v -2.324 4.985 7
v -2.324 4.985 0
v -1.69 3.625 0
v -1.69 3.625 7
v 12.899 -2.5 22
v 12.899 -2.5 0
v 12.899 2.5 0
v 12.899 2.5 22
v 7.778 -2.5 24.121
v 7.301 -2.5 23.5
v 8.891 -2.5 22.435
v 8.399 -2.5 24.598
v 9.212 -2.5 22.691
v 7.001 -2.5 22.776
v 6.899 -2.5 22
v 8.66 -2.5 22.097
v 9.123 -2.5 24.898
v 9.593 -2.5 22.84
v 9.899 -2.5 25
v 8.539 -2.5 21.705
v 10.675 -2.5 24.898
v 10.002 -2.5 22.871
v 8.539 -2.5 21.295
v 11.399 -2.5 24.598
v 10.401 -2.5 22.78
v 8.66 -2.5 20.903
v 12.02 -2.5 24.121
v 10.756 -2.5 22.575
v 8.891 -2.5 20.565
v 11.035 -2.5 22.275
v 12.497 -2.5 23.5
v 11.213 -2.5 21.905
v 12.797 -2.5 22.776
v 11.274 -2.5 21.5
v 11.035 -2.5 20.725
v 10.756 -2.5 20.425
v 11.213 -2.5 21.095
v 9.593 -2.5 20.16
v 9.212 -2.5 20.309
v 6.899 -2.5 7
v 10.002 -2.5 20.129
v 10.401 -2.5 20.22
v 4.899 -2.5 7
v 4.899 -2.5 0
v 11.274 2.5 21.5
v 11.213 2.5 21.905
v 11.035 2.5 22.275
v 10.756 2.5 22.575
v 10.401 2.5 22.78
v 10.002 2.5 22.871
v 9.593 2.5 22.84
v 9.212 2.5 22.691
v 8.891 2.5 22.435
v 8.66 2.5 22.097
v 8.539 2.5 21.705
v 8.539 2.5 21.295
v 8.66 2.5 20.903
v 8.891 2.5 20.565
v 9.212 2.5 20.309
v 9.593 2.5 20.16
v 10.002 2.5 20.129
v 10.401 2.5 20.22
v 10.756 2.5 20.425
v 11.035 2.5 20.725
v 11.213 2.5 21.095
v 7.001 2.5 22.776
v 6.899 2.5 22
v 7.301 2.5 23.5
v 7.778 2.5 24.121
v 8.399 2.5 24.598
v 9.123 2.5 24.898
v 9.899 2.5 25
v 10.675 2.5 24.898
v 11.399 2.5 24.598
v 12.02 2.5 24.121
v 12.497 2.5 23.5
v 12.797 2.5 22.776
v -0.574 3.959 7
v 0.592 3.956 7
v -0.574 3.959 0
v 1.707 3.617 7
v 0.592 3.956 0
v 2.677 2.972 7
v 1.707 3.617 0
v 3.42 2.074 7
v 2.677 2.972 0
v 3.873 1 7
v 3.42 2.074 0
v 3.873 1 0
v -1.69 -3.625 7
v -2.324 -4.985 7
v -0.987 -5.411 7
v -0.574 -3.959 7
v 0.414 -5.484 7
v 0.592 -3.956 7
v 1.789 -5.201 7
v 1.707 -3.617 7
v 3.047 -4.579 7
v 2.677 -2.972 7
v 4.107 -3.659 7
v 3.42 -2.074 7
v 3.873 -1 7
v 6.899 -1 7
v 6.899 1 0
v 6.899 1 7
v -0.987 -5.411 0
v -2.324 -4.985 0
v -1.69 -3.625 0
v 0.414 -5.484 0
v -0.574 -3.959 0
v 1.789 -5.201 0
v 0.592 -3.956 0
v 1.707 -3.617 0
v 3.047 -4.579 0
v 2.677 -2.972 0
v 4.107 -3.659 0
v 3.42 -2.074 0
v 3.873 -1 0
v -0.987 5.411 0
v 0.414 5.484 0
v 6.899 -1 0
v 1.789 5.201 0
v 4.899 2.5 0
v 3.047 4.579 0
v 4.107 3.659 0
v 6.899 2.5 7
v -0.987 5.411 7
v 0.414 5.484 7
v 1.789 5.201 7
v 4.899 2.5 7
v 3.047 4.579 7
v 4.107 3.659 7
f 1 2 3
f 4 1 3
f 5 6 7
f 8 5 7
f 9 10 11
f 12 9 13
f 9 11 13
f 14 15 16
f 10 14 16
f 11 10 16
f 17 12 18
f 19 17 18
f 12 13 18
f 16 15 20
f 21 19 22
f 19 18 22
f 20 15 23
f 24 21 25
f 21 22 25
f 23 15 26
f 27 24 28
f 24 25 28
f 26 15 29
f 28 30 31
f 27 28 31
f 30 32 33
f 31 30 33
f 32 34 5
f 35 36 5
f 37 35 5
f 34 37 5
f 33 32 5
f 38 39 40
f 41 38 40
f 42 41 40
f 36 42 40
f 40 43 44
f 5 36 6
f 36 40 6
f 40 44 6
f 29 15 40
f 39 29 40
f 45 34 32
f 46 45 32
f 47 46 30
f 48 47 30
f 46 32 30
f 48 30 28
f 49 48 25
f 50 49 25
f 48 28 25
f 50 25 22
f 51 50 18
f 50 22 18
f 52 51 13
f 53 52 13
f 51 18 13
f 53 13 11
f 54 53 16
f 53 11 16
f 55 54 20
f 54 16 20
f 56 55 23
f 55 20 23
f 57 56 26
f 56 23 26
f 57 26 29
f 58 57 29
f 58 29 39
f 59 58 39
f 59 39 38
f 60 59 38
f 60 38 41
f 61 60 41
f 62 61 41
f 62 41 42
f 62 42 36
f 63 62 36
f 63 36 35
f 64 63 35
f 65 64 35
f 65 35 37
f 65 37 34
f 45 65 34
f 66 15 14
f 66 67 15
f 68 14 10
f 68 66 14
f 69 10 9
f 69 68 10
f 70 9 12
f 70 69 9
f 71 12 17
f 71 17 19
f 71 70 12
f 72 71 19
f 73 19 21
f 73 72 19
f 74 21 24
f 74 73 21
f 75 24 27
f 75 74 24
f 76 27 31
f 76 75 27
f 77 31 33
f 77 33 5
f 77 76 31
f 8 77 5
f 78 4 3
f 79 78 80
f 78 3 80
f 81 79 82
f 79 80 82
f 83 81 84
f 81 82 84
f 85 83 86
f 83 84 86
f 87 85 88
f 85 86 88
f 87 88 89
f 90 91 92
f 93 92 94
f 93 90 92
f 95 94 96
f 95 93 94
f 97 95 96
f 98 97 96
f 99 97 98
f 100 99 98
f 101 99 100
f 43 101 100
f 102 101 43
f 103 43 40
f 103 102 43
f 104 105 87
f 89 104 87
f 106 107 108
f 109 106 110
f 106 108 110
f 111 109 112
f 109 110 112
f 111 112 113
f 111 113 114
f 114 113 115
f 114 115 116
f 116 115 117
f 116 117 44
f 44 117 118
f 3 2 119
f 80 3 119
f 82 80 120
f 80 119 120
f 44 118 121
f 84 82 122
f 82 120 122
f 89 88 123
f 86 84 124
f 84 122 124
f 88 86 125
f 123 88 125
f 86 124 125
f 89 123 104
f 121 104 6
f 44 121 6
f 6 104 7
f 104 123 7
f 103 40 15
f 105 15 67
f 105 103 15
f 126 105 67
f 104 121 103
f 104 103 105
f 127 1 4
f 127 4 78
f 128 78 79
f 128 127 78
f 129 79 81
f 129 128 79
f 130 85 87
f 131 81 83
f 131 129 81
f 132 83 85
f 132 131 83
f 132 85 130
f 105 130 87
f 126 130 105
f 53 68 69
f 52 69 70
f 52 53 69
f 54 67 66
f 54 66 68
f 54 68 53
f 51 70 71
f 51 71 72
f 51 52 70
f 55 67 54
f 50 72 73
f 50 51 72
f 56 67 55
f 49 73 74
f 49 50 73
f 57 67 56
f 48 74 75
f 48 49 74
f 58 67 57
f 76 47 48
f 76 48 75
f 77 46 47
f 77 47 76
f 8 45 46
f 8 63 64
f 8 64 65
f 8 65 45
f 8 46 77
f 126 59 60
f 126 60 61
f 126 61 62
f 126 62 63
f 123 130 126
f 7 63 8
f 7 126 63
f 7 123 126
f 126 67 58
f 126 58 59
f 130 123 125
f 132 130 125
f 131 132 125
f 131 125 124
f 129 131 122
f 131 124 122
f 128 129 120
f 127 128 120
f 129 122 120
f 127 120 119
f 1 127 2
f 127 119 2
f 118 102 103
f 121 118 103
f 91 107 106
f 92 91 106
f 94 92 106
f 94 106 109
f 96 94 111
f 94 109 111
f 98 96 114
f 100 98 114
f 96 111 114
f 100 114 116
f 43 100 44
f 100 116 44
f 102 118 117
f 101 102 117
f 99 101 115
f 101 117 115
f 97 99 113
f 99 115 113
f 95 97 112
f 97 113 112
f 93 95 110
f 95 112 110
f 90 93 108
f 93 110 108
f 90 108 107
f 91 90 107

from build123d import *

# Parameters (mm, degrees)
F1_DEPTH = 7
F0_W     = 6
F0_H     = 5
F2_DEPTH = 25
F3_R     = 1.3748922144
F4_DEPTH = 25
F5_R     = 2.99999
F7_DEPTH = 25


# Not quite as in the source:
# - a fillet or chamfer is up to 0.001 mm smaller than in the source, because OpenCascade refuses the exact size


with BuildPart() as f1:
    # F0 (on Top) → F1 (new body)
    with BuildSketch(Plane.XY):
        with BuildLine():
            ThreePointArc((-1.690473047, 3.6252311481), (2.1491984334, 3.3735657833), (4, 0))
            ThreePointArc((4, 0), (2.1491984334, -3.3735657833), (-1.690473047, -3.6252311481))
            Line((-1.690473047, -3.6252311481), (-2.3244004396, -4.9846928287))
            ThreePointArc((-2.3244004396, -4.9846928287), (1.789005011, -5.2009096388), (4.8989794856, -2.5))
            ThreePointArc((4.8989794856, -2.5), (5.3476343915, -1.2856151892), (5.5, 0))
            ThreePointArc((5.5, 0), (5.3476343915, 1.2856151892), (4.8989794856, 2.5))
            ThreePointArc((4.8989794856, 2.5), (1.789005011, 5.2009096388), (-2.3244004396, 4.9846928287))
            Line((-2.3244004396, 4.9846928287), (-1.690473047, 3.6252311481))
        make_face()
        with BuildLine():
            Line((6.8989794856, 2.5), (4.8989794856, 2.5))
            ThreePointArc((4.8989794856, 2.5), (5.3476343915, 1.2856151892), (5.5, 0))
            ThreePointArc((5.5, 0), (5.3476343915, -1.2856151892), (4.8989794856, -2.5))
            Line((4.8989794856, -2.5), (6.8989794856, -2.5))
            Line((6.8989794856, -2.5), (6.8989794856, 2.5))
        make_face()
    extrude(amount=F1_DEPTH)

    # F0 (on Top) → F2 (join)
    with BuildSketch(Plane.XY):
        with Locations((9.8989794856, 0)):
            Rectangle(F0_W, F0_H)
    extrude(amount=F2_DEPTH)

    # F3 (on face) → F4 (cut)
    with BuildSketch(Plane.XZ.offset(2.5)):
        with Locations((9.8989794856, 21.5)):
            Circle(F3_R)
    extrude(amount=-F4_DEPTH, mode=Mode.SUBTRACT)

    # F5 (radius 3 in the source; OpenCascade refuses exactly that, so slightly less here)
    f5_edges = [f1.edges().sort_by_distance(p)[0] for p in [
        (12.898979, 0, 25),
        (6.898979, 0, 25),
    ]]
    fillet(f5_edges, radius=F5_R)

    # F6 (on face) → F7 (cut)
    with BuildSketch(Plane.XY.offset(7)):
        with BuildLine():
            Line((3.8729833462, -1), (6.8989794856, -1))
            Line((6.8989794856, -1), (6.8989794856, 1))
            Line((6.8989794856, 1), (3.8729833462, 1))
            ThreePointArc((3.8729833462, 1), (4, 0), (3.8729833462, -1))
        make_face()
    extrude(amount=-F7_DEPTH, mode=Mode.SUBTRACT)


solid = f1.part
